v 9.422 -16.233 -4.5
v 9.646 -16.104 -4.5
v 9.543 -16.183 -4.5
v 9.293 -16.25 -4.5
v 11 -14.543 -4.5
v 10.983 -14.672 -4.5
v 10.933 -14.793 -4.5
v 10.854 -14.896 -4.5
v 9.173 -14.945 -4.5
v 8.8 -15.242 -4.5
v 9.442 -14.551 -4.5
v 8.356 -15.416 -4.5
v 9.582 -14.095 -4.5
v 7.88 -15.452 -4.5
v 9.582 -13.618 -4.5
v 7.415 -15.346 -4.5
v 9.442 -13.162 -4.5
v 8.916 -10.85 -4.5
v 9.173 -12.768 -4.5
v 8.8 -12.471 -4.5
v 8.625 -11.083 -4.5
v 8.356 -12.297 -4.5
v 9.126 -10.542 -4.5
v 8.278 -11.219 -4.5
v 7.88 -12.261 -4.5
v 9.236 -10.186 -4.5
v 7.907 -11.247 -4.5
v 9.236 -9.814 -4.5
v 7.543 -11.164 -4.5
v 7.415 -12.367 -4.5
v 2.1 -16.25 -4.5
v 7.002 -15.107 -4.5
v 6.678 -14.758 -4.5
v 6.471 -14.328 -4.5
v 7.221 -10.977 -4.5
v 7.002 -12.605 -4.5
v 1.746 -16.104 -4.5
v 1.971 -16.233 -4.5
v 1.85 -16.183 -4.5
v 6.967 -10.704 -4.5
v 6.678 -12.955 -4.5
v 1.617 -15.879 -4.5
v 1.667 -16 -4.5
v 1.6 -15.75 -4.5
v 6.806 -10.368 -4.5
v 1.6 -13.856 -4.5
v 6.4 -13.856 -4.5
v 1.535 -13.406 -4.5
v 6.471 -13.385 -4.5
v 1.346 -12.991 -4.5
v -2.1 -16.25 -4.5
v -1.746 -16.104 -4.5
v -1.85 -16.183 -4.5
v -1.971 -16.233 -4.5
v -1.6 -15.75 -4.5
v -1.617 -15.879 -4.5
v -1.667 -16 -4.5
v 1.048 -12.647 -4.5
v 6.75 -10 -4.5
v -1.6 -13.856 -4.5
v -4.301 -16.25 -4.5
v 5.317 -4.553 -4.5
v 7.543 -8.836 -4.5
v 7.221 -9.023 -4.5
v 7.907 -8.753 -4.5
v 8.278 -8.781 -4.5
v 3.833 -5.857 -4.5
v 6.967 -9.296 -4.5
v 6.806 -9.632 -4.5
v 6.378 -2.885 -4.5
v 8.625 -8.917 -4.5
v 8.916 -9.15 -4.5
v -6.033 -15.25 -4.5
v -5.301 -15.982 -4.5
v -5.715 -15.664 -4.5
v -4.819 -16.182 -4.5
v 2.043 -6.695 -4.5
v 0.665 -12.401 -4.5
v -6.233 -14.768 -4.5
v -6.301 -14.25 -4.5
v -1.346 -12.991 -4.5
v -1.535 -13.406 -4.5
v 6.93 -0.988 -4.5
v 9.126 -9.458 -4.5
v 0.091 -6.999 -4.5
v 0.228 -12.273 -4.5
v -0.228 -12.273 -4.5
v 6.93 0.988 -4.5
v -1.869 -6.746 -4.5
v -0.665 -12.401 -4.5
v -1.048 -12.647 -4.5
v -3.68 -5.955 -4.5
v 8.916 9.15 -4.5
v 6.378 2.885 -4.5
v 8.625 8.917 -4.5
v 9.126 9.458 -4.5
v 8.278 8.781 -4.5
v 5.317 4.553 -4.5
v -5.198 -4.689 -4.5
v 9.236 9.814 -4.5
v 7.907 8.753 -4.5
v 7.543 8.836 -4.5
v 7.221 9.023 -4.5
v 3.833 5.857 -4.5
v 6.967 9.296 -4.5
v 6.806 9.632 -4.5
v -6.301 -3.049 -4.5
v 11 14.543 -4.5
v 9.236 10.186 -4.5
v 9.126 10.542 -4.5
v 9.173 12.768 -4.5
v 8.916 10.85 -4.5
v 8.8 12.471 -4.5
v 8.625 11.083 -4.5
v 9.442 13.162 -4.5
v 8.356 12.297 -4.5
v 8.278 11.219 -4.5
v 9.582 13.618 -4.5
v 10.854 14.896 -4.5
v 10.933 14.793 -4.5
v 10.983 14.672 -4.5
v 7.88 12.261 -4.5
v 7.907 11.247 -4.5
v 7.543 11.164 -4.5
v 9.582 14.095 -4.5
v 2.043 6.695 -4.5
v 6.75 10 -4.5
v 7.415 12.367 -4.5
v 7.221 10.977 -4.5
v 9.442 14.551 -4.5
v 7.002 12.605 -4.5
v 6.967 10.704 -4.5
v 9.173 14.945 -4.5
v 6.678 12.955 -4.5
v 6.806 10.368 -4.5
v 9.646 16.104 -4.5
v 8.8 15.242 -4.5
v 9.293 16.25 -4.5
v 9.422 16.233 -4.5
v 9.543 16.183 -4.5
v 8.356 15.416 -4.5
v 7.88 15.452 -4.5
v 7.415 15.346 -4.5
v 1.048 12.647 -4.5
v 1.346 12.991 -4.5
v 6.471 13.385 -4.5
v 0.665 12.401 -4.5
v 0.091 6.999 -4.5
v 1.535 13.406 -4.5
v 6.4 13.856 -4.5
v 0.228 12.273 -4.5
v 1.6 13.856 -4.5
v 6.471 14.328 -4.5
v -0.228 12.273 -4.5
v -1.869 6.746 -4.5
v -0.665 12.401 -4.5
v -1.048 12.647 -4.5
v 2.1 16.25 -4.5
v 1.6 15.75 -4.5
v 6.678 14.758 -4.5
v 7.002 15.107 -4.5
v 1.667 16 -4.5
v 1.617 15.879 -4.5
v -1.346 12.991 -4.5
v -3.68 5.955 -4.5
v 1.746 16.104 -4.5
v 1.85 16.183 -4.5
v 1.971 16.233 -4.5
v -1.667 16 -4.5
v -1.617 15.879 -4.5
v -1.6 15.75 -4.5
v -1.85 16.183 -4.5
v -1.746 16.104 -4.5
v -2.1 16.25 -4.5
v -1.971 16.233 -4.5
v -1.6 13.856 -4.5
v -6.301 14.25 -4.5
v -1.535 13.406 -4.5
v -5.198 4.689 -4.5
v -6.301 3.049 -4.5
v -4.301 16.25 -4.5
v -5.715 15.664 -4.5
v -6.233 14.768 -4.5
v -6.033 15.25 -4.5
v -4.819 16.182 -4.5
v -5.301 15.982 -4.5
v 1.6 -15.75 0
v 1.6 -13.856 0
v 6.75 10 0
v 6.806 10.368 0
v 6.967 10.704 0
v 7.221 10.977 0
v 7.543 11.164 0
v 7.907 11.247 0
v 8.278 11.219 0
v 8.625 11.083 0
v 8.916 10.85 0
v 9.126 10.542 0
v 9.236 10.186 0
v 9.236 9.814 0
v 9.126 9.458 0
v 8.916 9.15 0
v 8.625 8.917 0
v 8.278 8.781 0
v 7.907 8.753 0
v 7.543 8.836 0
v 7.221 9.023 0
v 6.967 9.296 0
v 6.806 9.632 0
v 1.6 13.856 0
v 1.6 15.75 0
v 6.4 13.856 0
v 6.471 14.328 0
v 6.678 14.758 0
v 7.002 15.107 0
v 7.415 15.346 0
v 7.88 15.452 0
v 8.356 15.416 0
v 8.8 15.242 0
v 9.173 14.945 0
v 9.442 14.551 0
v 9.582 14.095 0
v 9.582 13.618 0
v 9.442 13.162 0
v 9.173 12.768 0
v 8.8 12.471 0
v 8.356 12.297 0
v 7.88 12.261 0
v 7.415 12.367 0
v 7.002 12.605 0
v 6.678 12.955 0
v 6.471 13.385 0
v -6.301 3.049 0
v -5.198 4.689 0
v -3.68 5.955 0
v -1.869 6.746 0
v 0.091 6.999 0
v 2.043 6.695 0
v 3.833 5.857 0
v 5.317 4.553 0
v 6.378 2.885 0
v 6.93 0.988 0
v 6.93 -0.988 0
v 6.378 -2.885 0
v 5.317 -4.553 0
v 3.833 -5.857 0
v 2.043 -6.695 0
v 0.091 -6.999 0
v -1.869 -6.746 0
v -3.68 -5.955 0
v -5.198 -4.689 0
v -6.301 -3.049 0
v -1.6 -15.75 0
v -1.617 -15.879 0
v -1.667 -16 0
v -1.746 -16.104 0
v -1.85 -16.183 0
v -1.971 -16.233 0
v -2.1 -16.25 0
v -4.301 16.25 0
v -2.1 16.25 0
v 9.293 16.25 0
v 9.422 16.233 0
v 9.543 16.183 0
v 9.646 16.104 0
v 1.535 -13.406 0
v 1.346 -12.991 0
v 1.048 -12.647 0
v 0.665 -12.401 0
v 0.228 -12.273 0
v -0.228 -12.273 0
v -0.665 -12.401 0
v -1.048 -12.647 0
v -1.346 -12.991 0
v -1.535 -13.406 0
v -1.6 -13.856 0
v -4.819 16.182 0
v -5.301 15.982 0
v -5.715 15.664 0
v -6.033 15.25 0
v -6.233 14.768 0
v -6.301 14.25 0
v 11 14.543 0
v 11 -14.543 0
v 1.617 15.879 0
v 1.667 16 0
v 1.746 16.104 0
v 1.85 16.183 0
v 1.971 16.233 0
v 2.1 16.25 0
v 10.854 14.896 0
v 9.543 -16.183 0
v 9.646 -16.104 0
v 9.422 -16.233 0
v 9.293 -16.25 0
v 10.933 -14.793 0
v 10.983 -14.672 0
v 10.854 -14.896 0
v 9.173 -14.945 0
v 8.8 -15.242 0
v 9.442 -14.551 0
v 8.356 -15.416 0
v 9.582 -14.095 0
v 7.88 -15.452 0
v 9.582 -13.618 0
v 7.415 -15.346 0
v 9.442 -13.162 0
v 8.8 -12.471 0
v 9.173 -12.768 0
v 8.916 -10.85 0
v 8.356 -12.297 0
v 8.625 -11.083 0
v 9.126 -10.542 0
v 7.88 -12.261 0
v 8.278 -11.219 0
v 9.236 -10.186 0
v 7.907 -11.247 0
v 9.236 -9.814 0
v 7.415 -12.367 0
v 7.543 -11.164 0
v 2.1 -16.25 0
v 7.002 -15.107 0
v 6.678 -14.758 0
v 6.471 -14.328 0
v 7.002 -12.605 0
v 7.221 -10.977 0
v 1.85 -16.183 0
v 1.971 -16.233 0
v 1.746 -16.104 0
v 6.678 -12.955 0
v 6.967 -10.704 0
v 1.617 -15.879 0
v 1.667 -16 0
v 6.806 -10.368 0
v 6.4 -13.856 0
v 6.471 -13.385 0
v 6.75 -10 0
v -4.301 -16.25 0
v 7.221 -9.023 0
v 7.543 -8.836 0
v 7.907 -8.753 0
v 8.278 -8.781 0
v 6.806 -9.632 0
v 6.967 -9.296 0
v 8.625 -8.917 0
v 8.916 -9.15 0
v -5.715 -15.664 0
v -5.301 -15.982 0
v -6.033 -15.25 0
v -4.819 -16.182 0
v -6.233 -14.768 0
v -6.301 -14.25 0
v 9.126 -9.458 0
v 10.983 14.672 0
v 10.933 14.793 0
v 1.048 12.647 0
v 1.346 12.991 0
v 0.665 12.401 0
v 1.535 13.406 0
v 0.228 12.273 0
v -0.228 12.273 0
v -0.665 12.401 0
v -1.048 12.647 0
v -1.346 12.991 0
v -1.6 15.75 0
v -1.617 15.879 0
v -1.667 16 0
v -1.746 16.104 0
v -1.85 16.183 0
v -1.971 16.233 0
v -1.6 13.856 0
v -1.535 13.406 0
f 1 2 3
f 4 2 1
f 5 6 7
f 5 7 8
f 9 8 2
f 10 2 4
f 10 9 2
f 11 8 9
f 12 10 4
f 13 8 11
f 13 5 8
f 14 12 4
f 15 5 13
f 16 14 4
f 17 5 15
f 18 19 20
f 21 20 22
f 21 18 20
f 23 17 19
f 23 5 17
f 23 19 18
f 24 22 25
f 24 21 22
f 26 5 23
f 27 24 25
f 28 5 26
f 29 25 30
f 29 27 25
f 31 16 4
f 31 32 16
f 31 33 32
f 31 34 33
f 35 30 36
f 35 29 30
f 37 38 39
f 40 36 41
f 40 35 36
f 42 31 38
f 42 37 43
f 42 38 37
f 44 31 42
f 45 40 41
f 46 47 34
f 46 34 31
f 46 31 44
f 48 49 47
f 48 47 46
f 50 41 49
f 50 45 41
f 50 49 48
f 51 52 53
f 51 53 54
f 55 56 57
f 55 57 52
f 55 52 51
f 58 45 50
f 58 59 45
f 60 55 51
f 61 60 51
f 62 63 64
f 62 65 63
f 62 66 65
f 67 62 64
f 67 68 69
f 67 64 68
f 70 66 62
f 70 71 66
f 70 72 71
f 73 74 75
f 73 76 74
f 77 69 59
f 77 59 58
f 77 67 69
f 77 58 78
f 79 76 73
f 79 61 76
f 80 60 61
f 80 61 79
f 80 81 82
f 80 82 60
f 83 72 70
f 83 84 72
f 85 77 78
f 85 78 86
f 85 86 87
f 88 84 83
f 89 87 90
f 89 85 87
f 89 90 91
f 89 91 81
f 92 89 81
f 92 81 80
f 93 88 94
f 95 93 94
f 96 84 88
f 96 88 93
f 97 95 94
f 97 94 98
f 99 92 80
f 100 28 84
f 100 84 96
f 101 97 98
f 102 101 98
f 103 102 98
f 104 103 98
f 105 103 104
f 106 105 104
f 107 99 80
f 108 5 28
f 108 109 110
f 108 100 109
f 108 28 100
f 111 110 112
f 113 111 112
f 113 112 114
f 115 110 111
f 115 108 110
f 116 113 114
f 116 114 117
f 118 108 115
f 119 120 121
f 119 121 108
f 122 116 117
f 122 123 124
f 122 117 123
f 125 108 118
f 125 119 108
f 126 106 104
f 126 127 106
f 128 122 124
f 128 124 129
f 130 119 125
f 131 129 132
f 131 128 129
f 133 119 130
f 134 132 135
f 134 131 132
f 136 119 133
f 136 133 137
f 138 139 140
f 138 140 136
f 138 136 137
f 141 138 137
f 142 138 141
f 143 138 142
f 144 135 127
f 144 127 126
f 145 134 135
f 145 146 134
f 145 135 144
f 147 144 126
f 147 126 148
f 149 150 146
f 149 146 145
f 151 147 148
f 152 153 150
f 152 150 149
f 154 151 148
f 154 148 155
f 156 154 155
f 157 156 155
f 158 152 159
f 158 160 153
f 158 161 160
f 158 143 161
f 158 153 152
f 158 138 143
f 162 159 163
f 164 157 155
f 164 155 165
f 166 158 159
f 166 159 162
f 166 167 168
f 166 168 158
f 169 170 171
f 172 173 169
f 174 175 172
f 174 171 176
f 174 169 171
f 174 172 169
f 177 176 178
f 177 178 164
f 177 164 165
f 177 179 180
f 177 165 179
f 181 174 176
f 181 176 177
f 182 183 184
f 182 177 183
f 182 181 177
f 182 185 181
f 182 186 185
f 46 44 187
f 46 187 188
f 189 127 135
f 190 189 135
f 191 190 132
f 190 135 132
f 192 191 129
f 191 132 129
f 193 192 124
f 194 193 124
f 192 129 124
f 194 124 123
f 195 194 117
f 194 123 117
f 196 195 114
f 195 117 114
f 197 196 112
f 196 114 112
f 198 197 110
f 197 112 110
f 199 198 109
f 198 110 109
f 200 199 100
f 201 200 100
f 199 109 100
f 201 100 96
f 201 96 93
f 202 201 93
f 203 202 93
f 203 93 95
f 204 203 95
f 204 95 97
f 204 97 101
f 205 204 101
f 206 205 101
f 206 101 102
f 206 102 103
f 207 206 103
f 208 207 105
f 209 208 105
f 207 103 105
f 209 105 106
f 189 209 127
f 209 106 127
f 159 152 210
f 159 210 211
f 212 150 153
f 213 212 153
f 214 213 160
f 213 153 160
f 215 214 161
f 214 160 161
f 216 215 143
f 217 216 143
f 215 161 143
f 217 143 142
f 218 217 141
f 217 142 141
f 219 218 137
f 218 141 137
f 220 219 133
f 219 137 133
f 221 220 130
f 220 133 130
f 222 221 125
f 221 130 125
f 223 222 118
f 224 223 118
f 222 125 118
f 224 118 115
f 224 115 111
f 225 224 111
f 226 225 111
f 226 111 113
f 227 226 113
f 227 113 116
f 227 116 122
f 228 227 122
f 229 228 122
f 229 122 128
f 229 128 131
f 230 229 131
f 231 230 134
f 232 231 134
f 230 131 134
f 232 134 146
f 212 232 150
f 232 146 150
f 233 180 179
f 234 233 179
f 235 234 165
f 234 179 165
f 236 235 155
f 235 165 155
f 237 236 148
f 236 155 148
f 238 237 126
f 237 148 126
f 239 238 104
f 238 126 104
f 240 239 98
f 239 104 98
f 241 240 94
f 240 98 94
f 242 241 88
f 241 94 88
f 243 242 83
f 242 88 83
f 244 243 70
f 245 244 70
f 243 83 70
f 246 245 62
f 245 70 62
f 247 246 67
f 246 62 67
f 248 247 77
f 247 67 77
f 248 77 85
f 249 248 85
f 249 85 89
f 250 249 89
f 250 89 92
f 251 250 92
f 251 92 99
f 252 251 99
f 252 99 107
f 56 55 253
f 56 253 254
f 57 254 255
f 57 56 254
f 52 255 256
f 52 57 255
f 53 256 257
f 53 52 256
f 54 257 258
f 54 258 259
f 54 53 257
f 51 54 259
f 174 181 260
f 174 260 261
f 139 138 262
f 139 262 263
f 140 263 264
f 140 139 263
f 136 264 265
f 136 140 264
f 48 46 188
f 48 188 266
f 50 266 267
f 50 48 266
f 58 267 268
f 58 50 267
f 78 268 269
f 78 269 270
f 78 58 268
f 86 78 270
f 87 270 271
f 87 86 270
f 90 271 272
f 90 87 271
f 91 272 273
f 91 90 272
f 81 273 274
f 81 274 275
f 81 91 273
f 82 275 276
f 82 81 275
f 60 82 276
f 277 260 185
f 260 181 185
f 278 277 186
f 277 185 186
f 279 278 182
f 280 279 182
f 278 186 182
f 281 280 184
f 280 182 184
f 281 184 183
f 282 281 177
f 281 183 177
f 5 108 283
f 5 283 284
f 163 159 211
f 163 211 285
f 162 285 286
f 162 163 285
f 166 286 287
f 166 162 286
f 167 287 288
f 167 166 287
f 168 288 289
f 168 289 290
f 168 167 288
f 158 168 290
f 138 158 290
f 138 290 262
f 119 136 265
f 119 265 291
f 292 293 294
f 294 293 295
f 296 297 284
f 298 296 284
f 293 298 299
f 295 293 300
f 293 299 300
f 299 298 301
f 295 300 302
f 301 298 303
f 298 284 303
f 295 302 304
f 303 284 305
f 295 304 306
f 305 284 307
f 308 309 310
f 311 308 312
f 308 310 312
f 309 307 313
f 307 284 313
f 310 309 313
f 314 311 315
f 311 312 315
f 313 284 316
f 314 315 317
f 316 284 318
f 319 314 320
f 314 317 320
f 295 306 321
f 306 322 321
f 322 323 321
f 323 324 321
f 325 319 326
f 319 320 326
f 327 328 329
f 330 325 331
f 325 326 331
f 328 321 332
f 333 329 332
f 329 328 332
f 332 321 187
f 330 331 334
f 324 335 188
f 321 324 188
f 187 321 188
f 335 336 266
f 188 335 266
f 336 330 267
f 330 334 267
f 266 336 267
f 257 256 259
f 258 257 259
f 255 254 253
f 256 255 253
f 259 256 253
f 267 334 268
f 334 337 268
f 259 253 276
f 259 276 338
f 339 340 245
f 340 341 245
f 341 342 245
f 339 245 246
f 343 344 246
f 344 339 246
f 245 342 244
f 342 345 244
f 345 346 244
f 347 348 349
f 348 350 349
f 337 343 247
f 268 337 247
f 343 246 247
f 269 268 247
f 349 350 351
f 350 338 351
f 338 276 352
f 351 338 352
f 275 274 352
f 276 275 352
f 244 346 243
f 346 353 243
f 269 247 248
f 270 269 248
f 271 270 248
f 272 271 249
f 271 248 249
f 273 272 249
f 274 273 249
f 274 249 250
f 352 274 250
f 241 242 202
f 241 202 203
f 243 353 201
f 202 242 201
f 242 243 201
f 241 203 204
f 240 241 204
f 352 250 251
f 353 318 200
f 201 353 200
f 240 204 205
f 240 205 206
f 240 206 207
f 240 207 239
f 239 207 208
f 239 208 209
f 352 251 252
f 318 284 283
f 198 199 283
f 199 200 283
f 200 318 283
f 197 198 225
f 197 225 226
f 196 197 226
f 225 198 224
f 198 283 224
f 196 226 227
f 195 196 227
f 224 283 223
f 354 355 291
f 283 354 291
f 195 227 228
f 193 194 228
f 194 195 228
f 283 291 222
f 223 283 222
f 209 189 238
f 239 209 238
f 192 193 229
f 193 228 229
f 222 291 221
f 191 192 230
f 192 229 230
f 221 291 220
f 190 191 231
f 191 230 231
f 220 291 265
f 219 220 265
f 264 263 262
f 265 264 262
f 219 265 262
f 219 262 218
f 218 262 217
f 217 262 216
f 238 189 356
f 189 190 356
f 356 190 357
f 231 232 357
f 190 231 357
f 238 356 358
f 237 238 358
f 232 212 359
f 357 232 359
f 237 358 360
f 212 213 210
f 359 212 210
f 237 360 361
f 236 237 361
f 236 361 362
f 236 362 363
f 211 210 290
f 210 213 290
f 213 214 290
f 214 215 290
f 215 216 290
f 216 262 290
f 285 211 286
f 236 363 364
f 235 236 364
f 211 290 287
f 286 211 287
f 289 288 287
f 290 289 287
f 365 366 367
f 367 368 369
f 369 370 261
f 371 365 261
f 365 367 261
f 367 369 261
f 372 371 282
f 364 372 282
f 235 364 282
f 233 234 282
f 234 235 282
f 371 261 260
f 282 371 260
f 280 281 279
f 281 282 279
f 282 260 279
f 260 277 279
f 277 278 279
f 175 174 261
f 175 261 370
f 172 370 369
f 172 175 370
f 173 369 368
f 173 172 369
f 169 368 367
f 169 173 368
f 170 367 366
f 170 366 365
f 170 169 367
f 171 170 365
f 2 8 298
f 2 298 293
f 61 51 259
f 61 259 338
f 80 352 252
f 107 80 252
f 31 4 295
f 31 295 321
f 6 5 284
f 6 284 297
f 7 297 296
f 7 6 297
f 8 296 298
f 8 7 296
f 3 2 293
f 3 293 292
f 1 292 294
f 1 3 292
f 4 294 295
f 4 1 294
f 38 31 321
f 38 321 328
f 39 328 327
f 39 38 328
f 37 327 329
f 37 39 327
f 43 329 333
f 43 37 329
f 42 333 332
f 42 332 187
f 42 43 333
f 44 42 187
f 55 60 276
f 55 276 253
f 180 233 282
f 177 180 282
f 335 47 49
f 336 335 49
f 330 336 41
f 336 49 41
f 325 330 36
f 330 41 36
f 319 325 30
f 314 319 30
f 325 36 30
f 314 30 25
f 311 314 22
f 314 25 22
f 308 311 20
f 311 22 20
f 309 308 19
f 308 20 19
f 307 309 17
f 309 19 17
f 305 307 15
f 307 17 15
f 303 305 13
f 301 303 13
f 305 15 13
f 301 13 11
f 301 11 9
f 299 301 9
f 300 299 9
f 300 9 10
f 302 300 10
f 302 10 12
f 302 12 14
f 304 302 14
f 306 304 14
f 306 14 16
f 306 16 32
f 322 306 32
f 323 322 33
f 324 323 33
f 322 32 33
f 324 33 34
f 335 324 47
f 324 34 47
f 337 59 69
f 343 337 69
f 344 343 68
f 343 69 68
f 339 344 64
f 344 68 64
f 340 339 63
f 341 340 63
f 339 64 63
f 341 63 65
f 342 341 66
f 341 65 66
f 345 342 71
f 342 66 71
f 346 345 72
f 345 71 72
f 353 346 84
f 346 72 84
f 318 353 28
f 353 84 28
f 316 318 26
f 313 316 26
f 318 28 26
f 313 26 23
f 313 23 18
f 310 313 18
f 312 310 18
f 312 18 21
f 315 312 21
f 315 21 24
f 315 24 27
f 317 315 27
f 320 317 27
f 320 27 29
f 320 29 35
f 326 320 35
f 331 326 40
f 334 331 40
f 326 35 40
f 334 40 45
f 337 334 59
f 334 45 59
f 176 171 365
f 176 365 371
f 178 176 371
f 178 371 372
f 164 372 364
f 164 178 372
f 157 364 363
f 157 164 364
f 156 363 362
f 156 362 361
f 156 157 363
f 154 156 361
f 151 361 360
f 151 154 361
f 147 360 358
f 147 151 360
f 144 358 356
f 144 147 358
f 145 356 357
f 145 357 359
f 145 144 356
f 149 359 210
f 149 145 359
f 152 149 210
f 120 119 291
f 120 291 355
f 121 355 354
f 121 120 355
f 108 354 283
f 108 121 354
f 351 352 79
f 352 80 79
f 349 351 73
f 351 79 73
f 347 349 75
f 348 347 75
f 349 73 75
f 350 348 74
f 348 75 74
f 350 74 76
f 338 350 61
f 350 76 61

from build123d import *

# Parameters (mm, degrees)
ESBO_O1_R                = 1.25
ESBO_O1_R_2              = 1.6
ESBO_O1_R_3              = 7
RESSALTO_EXTRUS_O1_DEPTH = 4.5
ESBO_O2_W                = 9.082800448
ESBO_O2_H                = 32.5
CORTE_EXTRUS_O1_DEPTH    = 5.5
FILETE1_R                = 2


with BuildPart() as part:
    # Esboço1 → Ressalto-extrusão1 (new body)
    with BuildSketch(Plane(origin=(0, 0, -4.5), x_dir=(-1, 0, 0), z_dir=(0, 0, -1))):
        with BuildLine():
            Line((-10.853553391, -14.896446609), (-9.646446609, -16.103553391))
            ThreePointArc((-9.646446609, -16.103553391), (-9.484234935, -16.211939766), (-9.292893219, -16.25))
            Line((-9.292893219, -16.25), (-2.1, -16.25))
            ThreePointArc((-2.1, -16.25), (-1.746446609, -16.103553391), (-1.6, -15.75))
            Line((-1.6, -15.75), (-1.6, -13.856406461))
            ThreePointArc((-1.6, -13.856406461), (0, -12.256406461), (1.6, -13.856406461))
            Line((1.6, -13.856406461), (1.6, -15.75))
            ThreePointArc((1.6, -15.75), (1.746446609, -16.103553391), (2.1, -16.25))
            Line((2.1, -16.25), (9.292893219, -16.25))
            ThreePointArc((9.292893219, -16.25), (9.484234935, -16.211939766), (9.646446609, -16.103553391))
            Line((9.646446609, -16.103553391), (10.853553391, -14.896446609))
            ThreePointArc((10.853553391, -14.896446609), (10.961939766, -14.734234935), (11, -14.542893219))
            Line((11, -14.542893219), (11, 14.542893219))
            ThreePointArc((11, 14.542893219), (10.961939766, 14.734234935), (10.853553391, 14.896446609))
            Line((10.853553391, 14.896446609), (9.646446609, 16.103553391))
            ThreePointArc((9.646446609, 16.103553391), (9.484234935, 16.211939766), (9.292893219, 16.25))
            Line((9.292893219, 16.25), (2.1, 16.25))
            ThreePointArc((2.1, 16.25), (1.746446609, 16.103553391), (1.6, 15.75))
            Line((1.6, 15.75), (1.6, 13.856406461))
            ThreePointArc((1.6, 13.856406461), (0, 12.256406461), (-1.6, 13.856406461))
            Line((-1.6, 13.856406461), (-1.6, 15.75))
            ThreePointArc((-1.6, 15.75), (-1.746446609, 16.103553391), (-2.1, 16.25))
            Line((-2.1, 16.25), (-9.292893219, 16.25))
            ThreePointArc((-9.292893219, 16.25), (-9.484234935, 16.211939766), (-9.646446609, 16.103553391))
            Line((-9.646446609, 16.103553391), (-10.853553391, 14.896446609))
            ThreePointArc((-10.853553391, 14.896446609), (-10.961939766, 14.734234935), (-11, 14.542893219))
            Line((-11, 14.542893219), (-11, -14.542893219))
            ThreePointArc((-11, -14.542893219), (-10.961939766, -14.734234935), (-10.853553391, -14.896446609))
        make_face()
        with Locations((-8, -10)):
            Circle(ESBO_O1_R, mode=Mode.SUBTRACT)
        with Locations((8, -10)):
            Circle(ESBO_O1_R, mode=Mode.SUBTRACT)
        with Locations((8, 10)):
            Circle(ESBO_O1_R, mode=Mode.SUBTRACT)
        with Locations((-8, 10)):
            Circle(ESBO_O1_R, mode=Mode.SUBTRACT)
        with Locations((-8, -13.85640646)):
            Circle(ESBO_O1_R_2, mode=Mode.SUBTRACT)
        with Locations((8, -13.85640646)):
            Circle(ESBO_O1_R_2, mode=Mode.SUBTRACT)
        with Locations((8, 13.85640646)):
            Circle(ESBO_O1_R_2, mode=Mode.SUBTRACT)
        with Locations((-8, 13.85640646)):
            Circle(ESBO_O1_R_2, mode=Mode.SUBTRACT)
        Circle(ESBO_O1_R_3, mode=Mode.SUBTRACT)
    extrude(amount=-RESSALTO_EXTRUS_O1_DEPTH)

    # Esboço2 → Corte-extrusão1 (cut, through all)
    with BuildSketch(Plane.XY):
        with Locations((-10.842301115, 0)):
            Rectangle(ESBO_O2_W, ESBO_O2_H)
    extrude(amount=-CORTE_EXTRUS_O1_DEPTH, mode=Mode.SUBTRACT)

    # Filete1
    filete1_edges = [part.edges().sort_by_distance(p)[0] for p in [
        (-6.300900891, 16.25, -2.25),
        (-6.300900891, -16.25, -2.25),
    ]]
    fillet(filete1_edges, radius=FILETE1_R)


solid = part.part
